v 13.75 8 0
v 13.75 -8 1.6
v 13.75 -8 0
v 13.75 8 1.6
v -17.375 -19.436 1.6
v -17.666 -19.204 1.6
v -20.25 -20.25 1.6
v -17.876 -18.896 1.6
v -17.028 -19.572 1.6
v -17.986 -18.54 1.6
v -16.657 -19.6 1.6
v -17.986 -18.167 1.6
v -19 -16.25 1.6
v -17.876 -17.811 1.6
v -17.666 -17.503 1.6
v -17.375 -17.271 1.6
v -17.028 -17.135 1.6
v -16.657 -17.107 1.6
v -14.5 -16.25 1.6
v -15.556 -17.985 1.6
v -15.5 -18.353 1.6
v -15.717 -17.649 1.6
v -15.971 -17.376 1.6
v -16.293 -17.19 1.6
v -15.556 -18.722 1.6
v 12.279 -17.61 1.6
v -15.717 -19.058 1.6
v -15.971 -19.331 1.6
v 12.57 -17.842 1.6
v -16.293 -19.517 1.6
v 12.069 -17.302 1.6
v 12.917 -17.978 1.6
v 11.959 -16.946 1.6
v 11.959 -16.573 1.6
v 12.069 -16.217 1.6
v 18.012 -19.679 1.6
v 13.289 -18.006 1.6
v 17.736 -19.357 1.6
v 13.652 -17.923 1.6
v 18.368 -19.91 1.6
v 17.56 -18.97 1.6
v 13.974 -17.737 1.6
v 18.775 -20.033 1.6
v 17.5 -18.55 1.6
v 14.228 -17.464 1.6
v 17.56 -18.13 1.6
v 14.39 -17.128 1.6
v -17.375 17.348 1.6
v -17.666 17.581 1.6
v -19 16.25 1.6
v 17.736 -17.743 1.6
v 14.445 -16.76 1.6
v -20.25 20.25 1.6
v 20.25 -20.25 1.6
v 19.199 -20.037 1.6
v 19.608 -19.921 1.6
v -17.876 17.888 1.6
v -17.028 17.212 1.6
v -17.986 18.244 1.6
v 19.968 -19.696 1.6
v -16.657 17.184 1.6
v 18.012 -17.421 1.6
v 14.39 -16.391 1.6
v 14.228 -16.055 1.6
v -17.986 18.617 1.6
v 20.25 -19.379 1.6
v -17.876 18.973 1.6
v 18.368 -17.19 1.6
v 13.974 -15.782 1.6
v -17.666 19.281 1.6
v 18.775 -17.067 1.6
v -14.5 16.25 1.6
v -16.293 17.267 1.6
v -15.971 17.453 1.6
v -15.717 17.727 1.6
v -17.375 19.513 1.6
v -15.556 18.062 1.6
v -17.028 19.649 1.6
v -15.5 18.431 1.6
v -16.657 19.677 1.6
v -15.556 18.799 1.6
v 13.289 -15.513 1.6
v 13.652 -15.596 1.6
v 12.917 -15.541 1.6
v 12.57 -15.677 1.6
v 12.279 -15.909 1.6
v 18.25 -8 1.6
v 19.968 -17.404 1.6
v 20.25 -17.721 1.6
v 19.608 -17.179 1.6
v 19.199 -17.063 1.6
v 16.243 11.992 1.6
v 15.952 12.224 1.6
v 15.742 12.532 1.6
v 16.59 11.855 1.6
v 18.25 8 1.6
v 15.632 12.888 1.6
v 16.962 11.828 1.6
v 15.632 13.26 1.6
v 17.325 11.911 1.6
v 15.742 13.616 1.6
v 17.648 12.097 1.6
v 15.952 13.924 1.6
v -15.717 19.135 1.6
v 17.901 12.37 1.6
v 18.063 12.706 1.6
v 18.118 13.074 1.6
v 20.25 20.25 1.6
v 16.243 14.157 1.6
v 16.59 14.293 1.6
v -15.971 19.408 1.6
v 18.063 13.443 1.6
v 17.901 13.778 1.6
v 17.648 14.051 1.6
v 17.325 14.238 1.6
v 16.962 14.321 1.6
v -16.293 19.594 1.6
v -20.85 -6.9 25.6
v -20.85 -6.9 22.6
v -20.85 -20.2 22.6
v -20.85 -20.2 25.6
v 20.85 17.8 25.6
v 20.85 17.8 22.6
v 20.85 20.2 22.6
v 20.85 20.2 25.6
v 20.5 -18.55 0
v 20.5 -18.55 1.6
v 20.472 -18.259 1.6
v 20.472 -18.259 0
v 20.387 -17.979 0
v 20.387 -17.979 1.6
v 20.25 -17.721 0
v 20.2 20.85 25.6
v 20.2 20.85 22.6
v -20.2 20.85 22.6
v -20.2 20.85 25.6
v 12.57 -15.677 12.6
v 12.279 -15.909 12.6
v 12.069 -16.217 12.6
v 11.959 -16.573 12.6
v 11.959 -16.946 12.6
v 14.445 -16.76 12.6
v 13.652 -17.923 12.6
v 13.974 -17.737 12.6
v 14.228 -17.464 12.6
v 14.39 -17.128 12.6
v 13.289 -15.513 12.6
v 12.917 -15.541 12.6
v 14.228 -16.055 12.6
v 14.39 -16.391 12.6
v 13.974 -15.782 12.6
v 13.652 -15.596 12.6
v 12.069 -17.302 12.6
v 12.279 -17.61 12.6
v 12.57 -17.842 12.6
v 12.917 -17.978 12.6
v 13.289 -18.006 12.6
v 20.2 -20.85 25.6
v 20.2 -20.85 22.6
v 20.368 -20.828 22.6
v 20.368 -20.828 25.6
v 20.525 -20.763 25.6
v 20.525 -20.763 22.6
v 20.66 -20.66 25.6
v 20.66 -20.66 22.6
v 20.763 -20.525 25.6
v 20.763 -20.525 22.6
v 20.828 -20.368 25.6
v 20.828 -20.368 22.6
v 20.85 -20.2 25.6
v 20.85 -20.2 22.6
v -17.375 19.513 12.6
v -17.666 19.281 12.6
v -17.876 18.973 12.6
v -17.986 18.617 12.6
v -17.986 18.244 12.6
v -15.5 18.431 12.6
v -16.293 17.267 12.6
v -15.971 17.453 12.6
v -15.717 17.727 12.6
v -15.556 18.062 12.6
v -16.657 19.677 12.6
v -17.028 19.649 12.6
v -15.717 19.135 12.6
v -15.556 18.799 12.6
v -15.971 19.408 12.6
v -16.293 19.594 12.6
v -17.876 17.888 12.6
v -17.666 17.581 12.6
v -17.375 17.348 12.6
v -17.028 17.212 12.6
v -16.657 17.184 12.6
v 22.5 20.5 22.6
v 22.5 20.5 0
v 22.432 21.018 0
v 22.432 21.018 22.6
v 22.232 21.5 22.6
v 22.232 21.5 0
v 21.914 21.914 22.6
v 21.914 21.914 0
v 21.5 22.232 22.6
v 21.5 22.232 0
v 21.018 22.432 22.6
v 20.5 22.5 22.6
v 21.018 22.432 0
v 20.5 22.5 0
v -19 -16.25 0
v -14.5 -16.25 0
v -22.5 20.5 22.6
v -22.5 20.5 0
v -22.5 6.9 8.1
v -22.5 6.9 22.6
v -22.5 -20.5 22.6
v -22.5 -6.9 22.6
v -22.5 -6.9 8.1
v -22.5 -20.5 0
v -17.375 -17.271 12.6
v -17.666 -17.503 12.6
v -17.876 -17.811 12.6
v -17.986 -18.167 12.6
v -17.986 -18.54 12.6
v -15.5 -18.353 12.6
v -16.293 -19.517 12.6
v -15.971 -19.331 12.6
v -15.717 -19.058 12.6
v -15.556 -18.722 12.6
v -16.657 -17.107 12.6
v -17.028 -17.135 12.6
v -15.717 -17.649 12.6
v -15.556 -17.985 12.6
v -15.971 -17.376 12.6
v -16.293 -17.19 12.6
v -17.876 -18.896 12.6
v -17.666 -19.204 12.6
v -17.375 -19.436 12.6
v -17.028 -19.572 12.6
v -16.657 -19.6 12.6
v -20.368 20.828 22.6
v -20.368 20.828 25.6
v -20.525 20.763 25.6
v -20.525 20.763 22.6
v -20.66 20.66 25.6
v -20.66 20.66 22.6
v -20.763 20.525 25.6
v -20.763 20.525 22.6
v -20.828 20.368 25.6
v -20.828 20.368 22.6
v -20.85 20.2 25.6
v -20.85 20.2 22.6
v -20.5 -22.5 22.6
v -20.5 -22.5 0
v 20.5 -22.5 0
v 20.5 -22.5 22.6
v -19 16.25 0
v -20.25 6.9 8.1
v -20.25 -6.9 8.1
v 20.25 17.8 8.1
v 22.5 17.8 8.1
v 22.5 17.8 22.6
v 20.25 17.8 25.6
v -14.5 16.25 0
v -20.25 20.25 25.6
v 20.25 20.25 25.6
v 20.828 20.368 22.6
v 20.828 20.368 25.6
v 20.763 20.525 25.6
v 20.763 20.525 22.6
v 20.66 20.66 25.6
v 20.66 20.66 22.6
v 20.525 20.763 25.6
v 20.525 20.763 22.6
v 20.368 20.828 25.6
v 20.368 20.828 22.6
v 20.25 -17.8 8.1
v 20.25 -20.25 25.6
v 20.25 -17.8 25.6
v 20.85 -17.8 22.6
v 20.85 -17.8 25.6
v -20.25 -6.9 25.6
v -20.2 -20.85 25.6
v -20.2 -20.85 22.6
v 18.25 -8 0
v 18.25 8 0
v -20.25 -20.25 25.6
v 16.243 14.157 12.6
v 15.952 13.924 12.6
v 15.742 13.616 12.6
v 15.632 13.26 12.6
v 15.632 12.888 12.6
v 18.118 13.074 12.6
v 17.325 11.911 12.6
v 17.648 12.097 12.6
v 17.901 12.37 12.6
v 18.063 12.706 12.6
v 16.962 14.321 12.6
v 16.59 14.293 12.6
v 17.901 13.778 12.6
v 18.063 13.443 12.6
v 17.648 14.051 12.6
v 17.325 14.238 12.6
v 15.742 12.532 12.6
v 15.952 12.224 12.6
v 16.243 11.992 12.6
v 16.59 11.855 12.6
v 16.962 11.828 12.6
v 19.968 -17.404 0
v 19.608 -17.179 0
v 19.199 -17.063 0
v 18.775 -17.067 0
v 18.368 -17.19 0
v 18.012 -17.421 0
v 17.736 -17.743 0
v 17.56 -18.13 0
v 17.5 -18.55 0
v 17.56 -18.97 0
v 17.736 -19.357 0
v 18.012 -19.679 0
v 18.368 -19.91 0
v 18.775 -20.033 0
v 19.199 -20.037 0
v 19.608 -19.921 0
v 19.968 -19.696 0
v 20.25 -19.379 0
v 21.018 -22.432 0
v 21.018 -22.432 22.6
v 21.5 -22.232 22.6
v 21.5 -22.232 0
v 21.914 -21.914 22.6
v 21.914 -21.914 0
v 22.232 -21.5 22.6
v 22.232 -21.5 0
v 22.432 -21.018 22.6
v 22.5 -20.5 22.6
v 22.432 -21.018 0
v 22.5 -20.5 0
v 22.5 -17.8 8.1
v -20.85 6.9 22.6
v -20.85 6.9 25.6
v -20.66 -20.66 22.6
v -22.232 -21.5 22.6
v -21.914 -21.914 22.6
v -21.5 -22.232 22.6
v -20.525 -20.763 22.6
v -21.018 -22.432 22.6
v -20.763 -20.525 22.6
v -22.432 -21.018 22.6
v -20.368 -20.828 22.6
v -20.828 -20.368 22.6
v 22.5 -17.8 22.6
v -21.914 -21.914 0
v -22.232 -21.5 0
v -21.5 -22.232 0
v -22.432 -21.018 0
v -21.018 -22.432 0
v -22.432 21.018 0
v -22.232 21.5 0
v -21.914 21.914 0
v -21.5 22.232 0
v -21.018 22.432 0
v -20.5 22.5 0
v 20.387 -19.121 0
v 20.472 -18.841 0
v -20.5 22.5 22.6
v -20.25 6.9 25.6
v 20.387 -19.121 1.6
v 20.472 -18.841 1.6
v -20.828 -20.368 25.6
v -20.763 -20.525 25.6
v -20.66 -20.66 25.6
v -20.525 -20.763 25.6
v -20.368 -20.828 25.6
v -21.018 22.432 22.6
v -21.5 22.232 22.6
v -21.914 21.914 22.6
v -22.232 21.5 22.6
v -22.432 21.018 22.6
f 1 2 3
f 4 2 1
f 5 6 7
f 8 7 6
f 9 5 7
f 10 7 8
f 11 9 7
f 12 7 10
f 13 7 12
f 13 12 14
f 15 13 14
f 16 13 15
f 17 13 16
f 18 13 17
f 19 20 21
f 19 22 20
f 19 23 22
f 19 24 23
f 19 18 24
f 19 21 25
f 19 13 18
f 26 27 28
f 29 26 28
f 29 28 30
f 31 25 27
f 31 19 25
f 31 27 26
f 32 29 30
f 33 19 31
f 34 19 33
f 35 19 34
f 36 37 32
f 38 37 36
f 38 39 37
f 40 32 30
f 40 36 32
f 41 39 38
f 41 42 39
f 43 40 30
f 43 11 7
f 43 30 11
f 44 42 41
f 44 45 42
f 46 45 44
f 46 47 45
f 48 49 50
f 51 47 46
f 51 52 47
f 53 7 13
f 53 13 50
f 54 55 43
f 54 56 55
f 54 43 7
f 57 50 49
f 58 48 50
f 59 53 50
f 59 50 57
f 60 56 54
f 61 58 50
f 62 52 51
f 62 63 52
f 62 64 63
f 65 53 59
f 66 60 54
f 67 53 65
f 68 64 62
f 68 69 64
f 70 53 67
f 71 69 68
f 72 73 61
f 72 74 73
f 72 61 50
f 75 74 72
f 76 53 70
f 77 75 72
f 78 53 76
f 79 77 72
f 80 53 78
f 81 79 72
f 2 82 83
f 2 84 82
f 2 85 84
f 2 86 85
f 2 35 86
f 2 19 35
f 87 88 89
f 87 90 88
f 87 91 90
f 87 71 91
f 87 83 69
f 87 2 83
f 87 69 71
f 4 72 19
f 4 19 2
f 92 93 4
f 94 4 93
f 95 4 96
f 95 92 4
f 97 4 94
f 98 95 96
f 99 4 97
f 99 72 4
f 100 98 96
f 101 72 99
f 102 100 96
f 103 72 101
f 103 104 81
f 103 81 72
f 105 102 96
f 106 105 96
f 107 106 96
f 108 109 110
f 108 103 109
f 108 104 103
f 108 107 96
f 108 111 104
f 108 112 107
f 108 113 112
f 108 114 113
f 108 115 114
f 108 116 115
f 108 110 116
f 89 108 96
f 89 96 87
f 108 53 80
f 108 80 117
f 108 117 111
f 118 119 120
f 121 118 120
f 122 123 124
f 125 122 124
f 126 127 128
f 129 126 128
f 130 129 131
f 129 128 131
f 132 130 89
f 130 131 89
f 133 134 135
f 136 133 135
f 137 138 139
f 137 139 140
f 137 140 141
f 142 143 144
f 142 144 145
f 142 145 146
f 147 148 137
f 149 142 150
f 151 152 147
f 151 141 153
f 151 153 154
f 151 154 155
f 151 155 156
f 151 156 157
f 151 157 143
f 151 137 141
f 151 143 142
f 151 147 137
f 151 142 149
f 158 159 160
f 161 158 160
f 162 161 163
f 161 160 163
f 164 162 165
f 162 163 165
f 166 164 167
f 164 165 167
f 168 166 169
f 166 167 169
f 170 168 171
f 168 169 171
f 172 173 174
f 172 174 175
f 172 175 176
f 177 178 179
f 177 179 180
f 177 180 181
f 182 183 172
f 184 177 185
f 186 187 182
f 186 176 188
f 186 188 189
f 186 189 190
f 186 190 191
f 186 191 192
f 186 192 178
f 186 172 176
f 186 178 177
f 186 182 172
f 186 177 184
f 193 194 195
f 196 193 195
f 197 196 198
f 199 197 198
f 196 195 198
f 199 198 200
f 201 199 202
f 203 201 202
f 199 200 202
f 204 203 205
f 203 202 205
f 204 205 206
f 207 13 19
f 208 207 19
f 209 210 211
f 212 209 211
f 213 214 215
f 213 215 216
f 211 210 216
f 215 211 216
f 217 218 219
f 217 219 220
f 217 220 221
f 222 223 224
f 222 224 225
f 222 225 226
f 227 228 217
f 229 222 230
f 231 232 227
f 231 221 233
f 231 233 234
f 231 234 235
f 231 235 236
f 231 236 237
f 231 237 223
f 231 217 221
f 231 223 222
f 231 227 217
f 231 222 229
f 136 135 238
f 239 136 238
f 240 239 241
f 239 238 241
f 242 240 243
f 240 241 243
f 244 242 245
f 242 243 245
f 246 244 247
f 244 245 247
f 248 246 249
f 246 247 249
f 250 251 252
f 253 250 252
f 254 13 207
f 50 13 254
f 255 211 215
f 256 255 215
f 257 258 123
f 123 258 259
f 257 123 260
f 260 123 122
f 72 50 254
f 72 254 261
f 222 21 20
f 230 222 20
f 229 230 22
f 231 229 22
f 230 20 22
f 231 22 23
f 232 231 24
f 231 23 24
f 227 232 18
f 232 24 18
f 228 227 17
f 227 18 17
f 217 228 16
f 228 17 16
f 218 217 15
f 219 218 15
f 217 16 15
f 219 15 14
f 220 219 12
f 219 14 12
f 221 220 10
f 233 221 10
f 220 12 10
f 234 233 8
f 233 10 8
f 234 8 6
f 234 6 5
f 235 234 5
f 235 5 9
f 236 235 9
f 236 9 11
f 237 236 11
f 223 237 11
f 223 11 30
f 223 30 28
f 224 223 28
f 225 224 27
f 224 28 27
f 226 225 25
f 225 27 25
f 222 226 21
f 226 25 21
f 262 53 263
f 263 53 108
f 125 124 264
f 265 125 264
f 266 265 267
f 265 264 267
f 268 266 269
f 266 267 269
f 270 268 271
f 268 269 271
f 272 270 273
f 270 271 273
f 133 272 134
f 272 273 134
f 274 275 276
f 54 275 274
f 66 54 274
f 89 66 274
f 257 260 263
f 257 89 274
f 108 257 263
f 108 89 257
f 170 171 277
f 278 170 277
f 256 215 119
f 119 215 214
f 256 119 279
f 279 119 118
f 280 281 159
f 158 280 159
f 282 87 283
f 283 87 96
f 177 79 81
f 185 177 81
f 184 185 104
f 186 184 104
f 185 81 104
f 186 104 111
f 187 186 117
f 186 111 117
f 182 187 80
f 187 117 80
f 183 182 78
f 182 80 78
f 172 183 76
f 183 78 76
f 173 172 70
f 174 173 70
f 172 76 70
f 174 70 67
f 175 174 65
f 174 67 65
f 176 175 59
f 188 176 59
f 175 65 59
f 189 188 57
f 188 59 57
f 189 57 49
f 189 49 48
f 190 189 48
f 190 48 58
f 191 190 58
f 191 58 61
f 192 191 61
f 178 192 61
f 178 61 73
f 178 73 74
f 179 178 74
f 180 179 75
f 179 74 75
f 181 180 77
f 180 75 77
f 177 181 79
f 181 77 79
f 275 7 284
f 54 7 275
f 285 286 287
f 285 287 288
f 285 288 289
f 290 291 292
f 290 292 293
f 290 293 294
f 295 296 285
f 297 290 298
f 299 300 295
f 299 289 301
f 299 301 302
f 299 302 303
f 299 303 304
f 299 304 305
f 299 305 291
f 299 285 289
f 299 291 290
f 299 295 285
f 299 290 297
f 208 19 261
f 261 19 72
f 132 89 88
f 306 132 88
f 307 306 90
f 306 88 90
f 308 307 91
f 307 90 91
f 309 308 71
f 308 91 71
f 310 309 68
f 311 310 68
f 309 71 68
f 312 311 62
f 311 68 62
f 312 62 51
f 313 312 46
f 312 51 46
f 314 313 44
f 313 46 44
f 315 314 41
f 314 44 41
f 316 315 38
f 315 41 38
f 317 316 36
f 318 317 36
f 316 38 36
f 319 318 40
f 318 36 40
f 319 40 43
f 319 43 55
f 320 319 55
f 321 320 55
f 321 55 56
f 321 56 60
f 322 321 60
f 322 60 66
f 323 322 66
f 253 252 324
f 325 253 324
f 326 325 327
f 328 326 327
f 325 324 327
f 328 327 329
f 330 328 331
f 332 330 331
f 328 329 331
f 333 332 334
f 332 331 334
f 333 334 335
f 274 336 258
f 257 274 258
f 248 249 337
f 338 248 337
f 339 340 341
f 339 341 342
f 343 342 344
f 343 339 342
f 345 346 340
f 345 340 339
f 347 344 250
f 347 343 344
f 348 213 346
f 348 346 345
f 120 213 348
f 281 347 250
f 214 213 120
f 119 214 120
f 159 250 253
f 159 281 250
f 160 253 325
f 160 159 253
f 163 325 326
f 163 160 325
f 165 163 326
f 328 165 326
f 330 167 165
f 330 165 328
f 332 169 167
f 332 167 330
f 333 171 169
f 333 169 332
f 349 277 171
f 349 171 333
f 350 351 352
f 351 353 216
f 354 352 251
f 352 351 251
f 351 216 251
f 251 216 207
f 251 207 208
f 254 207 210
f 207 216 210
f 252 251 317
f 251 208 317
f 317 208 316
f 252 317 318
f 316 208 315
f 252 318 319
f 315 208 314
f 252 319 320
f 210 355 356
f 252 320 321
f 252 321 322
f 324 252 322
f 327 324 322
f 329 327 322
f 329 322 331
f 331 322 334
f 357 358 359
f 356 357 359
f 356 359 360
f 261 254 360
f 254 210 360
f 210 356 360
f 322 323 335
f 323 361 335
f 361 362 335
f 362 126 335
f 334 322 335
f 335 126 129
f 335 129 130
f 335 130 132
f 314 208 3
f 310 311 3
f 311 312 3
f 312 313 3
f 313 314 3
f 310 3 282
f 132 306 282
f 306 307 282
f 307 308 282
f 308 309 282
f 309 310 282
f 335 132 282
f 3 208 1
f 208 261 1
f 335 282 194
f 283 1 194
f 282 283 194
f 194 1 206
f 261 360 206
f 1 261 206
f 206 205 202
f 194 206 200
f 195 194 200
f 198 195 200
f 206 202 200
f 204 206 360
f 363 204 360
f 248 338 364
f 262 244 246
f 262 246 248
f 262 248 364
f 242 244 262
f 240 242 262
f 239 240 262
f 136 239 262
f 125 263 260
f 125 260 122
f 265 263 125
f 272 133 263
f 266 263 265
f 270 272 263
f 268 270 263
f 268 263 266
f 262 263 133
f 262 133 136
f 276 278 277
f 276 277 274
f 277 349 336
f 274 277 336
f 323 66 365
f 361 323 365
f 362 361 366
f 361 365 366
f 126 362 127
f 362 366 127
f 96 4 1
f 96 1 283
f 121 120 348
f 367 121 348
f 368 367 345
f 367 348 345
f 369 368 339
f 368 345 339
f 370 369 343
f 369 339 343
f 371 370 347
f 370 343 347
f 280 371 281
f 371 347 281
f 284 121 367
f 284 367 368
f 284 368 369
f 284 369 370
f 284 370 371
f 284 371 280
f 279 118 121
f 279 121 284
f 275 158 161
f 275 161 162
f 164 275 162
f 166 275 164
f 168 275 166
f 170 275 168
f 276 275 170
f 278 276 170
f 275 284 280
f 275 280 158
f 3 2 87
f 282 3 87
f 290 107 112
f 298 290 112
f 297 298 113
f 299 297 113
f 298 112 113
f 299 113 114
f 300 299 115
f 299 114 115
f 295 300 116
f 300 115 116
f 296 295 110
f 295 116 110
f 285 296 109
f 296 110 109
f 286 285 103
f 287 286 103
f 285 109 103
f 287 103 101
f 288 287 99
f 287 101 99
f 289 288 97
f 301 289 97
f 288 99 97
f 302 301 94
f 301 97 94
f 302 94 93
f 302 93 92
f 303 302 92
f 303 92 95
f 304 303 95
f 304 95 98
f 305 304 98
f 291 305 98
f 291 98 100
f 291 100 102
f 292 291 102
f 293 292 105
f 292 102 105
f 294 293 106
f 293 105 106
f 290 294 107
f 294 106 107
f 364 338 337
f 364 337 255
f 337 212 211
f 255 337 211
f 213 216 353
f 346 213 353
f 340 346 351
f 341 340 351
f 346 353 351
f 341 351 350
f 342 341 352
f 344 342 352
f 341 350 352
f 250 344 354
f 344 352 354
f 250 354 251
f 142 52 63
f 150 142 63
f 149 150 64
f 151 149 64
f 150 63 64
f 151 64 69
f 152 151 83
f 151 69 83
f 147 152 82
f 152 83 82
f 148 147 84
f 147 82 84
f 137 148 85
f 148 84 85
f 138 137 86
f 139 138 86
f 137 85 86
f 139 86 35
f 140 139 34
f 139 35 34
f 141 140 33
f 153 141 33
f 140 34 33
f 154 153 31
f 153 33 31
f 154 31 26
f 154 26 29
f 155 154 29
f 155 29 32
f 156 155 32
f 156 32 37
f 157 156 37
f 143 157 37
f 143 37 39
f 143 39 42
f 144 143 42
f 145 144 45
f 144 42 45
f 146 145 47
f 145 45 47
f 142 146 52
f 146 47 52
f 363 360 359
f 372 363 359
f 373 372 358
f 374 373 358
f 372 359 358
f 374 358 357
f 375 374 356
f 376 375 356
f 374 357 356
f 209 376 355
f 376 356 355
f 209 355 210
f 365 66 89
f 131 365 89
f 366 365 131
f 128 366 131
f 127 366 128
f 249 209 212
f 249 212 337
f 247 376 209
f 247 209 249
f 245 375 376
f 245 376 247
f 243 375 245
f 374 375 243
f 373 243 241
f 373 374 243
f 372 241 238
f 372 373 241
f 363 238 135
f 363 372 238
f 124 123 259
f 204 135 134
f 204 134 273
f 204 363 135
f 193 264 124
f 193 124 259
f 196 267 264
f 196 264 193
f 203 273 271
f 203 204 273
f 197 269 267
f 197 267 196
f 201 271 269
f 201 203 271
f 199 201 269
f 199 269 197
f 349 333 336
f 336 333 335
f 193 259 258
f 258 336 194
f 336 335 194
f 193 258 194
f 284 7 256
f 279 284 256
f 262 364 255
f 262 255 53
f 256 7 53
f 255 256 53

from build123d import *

# Parameters (mm, degrees)
F0_W      = 40.5
F0_H      = 40.5
F1_DEPTH  = 1.6
F2_DEPTH  = 22.6
F3_W      = 40.5
F3_H      = 40.5
F4_DEPTH  = 3
F5_W      = 35.6
F5_H      = 14.5
F5_H_2    = 3
F6_DEPTH  = 5
F7_W      = 13.8
F7_H      = 14.5
F7_H_2    = 3
F8_DEPTH  = 5
F9_W      = 4.5
F9_H      = 16
F9_H_2    = 32.5
F10_DEPTH = 5
F11_R     = 1.25
F12_DEPTH = 11


with BuildPart() as f1:
    # F0 (on Top) → F1 (new body)
    with BuildSketch(Plane.XY):
        Rectangle(F0_W, F0_H)
    extrude(amount=F1_DEPTH)

    # F0 (on Top) → F2 (join)
    with BuildSketch(Plane.XY):
        with BuildLine():
            Line((20.5, 22.5), (-20.5, 22.5))
            ThreePointArc((-20.5, 22.5), (-21.9142135624, 21.9142135624), (-22.5, 20.5))
            Line((-22.5, 20.5), (-22.5, -20.5))
            ThreePointArc((-22.5, -20.5), (-21.9142135624, -21.9142135624), (-20.5, -22.5))
            Line((-20.5, -22.5), (20.5, -22.5))
            ThreePointArc((20.5, -22.5), (21.9142135624, -21.9142135624), (22.5, -20.5))
            Line((22.5, -20.5), (22.5, 20.5))
            ThreePointArc((22.5, 20.5), (21.9142135624, 21.9142135624), (20.5, 22.5))
        make_face()
        Rectangle(F0_W, F0_H, mode=Mode.SUBTRACT)
    extrude(amount=F2_DEPTH)

    # F3 (on face) → F4 (join)
    with BuildSketch(Plane.XY.offset(22.6)):
        with BuildLine():
            Line((20.2, 20.85), (-20.2, 20.85))
            ThreePointArc((-20.2, 20.85), (-20.6596194078, 20.6596194078), (-20.85, 20.2))
            Line((-20.85, 20.2), (-20.85, -20.2))
            ThreePointArc((-20.85, -20.2), (-20.6596194078, -20.6596194078), (-20.2, -20.85))
            Line((-20.2, -20.85), (20.2, -20.85))
            ThreePointArc((20.2, -20.85), (20.6596194078, -20.6596194078), (20.85, -20.2))
            Line((20.85, -20.2), (20.85, 20.2))
            ThreePointArc((20.85, 20.2), (20.6596194078, 20.6596194078), (20.2, 20.85))
        make_face()
        Rectangle(F3_W, F3_H, mode=Mode.SUBTRACT)
    extrude(amount=F4_DEPTH)

    # F5 (on face) → F6 (cut)
    with BuildSketch(Plane.YZ.offset(22.5)):
        with Locations((0, 15.35)):
            Rectangle(F5_W, F5_H)
        with Locations((0, 24.1)):
            Rectangle(F5_W, F5_H_2)
    extrude(amount=-F6_DEPTH, mode=Mode.SUBTRACT)

    # F7 (on face) → F8 (cut)
    with BuildSketch(Plane(origin=(-22.5, 0, 0), x_dir=(0, -1, 0), z_dir=(-1, 0, 0))):
        with Locations((0, 15.35)):
            Rectangle(F7_W, F7_H)
        with Locations((0, 24.1)):
            Rectangle(F7_W, F7_H_2)
    extrude(amount=-F8_DEPTH, mode=Mode.SUBTRACT)

    # F9 (on face) → F10 (cut)
    with BuildSketch(Plane.XY.offset(1.6)):
        with Locations((16, 0)):
            Rectangle(F9_W, F9_H)
        with BuildLine():
            Line((20.25, -19.3791561976), (20.25, -17.7208438024))
            ThreePointArc((20.25, -17.7208438024), (17.5, -18.55), (20.25, -19.3791561976))
        make_face()
        with BuildLine():
            ThreePointArc((20.25, -19.3791561976), (20.4361406616, -18.9830127019), (20.5, -18.55))
            ThreePointArc((20.5, -18.55), (20.4361406616, -18.1169872981), (20.25, -17.7208438024))
            Line((20.25, -17.7208438024), (20.25, -19.3791561976))
        make_face()
        with Locations((-16.75, 0)):
            Rectangle(F9_W, F9_H_2)
    extrude(amount=-F10_DEPTH, mode=Mode.SUBTRACT)

    # F11 (on face) → F12 (join)
    with BuildSketch(Plane.XY.offset(1.6)):
        with Locations((16.8683137745, 13.0740953609)):
            Circle(F11_R)
        with Locations((-16.75, 18.4307503104)):
            Circle(F11_R)
        with Locations((-16.75, -18.3533816189)):
            Circle(F11_R)
        with Locations((13.195104897, -16.7595241219)):
            Circle(F11_R)
    extrude(amount=F12_DEPTH)


solid = f1.part
